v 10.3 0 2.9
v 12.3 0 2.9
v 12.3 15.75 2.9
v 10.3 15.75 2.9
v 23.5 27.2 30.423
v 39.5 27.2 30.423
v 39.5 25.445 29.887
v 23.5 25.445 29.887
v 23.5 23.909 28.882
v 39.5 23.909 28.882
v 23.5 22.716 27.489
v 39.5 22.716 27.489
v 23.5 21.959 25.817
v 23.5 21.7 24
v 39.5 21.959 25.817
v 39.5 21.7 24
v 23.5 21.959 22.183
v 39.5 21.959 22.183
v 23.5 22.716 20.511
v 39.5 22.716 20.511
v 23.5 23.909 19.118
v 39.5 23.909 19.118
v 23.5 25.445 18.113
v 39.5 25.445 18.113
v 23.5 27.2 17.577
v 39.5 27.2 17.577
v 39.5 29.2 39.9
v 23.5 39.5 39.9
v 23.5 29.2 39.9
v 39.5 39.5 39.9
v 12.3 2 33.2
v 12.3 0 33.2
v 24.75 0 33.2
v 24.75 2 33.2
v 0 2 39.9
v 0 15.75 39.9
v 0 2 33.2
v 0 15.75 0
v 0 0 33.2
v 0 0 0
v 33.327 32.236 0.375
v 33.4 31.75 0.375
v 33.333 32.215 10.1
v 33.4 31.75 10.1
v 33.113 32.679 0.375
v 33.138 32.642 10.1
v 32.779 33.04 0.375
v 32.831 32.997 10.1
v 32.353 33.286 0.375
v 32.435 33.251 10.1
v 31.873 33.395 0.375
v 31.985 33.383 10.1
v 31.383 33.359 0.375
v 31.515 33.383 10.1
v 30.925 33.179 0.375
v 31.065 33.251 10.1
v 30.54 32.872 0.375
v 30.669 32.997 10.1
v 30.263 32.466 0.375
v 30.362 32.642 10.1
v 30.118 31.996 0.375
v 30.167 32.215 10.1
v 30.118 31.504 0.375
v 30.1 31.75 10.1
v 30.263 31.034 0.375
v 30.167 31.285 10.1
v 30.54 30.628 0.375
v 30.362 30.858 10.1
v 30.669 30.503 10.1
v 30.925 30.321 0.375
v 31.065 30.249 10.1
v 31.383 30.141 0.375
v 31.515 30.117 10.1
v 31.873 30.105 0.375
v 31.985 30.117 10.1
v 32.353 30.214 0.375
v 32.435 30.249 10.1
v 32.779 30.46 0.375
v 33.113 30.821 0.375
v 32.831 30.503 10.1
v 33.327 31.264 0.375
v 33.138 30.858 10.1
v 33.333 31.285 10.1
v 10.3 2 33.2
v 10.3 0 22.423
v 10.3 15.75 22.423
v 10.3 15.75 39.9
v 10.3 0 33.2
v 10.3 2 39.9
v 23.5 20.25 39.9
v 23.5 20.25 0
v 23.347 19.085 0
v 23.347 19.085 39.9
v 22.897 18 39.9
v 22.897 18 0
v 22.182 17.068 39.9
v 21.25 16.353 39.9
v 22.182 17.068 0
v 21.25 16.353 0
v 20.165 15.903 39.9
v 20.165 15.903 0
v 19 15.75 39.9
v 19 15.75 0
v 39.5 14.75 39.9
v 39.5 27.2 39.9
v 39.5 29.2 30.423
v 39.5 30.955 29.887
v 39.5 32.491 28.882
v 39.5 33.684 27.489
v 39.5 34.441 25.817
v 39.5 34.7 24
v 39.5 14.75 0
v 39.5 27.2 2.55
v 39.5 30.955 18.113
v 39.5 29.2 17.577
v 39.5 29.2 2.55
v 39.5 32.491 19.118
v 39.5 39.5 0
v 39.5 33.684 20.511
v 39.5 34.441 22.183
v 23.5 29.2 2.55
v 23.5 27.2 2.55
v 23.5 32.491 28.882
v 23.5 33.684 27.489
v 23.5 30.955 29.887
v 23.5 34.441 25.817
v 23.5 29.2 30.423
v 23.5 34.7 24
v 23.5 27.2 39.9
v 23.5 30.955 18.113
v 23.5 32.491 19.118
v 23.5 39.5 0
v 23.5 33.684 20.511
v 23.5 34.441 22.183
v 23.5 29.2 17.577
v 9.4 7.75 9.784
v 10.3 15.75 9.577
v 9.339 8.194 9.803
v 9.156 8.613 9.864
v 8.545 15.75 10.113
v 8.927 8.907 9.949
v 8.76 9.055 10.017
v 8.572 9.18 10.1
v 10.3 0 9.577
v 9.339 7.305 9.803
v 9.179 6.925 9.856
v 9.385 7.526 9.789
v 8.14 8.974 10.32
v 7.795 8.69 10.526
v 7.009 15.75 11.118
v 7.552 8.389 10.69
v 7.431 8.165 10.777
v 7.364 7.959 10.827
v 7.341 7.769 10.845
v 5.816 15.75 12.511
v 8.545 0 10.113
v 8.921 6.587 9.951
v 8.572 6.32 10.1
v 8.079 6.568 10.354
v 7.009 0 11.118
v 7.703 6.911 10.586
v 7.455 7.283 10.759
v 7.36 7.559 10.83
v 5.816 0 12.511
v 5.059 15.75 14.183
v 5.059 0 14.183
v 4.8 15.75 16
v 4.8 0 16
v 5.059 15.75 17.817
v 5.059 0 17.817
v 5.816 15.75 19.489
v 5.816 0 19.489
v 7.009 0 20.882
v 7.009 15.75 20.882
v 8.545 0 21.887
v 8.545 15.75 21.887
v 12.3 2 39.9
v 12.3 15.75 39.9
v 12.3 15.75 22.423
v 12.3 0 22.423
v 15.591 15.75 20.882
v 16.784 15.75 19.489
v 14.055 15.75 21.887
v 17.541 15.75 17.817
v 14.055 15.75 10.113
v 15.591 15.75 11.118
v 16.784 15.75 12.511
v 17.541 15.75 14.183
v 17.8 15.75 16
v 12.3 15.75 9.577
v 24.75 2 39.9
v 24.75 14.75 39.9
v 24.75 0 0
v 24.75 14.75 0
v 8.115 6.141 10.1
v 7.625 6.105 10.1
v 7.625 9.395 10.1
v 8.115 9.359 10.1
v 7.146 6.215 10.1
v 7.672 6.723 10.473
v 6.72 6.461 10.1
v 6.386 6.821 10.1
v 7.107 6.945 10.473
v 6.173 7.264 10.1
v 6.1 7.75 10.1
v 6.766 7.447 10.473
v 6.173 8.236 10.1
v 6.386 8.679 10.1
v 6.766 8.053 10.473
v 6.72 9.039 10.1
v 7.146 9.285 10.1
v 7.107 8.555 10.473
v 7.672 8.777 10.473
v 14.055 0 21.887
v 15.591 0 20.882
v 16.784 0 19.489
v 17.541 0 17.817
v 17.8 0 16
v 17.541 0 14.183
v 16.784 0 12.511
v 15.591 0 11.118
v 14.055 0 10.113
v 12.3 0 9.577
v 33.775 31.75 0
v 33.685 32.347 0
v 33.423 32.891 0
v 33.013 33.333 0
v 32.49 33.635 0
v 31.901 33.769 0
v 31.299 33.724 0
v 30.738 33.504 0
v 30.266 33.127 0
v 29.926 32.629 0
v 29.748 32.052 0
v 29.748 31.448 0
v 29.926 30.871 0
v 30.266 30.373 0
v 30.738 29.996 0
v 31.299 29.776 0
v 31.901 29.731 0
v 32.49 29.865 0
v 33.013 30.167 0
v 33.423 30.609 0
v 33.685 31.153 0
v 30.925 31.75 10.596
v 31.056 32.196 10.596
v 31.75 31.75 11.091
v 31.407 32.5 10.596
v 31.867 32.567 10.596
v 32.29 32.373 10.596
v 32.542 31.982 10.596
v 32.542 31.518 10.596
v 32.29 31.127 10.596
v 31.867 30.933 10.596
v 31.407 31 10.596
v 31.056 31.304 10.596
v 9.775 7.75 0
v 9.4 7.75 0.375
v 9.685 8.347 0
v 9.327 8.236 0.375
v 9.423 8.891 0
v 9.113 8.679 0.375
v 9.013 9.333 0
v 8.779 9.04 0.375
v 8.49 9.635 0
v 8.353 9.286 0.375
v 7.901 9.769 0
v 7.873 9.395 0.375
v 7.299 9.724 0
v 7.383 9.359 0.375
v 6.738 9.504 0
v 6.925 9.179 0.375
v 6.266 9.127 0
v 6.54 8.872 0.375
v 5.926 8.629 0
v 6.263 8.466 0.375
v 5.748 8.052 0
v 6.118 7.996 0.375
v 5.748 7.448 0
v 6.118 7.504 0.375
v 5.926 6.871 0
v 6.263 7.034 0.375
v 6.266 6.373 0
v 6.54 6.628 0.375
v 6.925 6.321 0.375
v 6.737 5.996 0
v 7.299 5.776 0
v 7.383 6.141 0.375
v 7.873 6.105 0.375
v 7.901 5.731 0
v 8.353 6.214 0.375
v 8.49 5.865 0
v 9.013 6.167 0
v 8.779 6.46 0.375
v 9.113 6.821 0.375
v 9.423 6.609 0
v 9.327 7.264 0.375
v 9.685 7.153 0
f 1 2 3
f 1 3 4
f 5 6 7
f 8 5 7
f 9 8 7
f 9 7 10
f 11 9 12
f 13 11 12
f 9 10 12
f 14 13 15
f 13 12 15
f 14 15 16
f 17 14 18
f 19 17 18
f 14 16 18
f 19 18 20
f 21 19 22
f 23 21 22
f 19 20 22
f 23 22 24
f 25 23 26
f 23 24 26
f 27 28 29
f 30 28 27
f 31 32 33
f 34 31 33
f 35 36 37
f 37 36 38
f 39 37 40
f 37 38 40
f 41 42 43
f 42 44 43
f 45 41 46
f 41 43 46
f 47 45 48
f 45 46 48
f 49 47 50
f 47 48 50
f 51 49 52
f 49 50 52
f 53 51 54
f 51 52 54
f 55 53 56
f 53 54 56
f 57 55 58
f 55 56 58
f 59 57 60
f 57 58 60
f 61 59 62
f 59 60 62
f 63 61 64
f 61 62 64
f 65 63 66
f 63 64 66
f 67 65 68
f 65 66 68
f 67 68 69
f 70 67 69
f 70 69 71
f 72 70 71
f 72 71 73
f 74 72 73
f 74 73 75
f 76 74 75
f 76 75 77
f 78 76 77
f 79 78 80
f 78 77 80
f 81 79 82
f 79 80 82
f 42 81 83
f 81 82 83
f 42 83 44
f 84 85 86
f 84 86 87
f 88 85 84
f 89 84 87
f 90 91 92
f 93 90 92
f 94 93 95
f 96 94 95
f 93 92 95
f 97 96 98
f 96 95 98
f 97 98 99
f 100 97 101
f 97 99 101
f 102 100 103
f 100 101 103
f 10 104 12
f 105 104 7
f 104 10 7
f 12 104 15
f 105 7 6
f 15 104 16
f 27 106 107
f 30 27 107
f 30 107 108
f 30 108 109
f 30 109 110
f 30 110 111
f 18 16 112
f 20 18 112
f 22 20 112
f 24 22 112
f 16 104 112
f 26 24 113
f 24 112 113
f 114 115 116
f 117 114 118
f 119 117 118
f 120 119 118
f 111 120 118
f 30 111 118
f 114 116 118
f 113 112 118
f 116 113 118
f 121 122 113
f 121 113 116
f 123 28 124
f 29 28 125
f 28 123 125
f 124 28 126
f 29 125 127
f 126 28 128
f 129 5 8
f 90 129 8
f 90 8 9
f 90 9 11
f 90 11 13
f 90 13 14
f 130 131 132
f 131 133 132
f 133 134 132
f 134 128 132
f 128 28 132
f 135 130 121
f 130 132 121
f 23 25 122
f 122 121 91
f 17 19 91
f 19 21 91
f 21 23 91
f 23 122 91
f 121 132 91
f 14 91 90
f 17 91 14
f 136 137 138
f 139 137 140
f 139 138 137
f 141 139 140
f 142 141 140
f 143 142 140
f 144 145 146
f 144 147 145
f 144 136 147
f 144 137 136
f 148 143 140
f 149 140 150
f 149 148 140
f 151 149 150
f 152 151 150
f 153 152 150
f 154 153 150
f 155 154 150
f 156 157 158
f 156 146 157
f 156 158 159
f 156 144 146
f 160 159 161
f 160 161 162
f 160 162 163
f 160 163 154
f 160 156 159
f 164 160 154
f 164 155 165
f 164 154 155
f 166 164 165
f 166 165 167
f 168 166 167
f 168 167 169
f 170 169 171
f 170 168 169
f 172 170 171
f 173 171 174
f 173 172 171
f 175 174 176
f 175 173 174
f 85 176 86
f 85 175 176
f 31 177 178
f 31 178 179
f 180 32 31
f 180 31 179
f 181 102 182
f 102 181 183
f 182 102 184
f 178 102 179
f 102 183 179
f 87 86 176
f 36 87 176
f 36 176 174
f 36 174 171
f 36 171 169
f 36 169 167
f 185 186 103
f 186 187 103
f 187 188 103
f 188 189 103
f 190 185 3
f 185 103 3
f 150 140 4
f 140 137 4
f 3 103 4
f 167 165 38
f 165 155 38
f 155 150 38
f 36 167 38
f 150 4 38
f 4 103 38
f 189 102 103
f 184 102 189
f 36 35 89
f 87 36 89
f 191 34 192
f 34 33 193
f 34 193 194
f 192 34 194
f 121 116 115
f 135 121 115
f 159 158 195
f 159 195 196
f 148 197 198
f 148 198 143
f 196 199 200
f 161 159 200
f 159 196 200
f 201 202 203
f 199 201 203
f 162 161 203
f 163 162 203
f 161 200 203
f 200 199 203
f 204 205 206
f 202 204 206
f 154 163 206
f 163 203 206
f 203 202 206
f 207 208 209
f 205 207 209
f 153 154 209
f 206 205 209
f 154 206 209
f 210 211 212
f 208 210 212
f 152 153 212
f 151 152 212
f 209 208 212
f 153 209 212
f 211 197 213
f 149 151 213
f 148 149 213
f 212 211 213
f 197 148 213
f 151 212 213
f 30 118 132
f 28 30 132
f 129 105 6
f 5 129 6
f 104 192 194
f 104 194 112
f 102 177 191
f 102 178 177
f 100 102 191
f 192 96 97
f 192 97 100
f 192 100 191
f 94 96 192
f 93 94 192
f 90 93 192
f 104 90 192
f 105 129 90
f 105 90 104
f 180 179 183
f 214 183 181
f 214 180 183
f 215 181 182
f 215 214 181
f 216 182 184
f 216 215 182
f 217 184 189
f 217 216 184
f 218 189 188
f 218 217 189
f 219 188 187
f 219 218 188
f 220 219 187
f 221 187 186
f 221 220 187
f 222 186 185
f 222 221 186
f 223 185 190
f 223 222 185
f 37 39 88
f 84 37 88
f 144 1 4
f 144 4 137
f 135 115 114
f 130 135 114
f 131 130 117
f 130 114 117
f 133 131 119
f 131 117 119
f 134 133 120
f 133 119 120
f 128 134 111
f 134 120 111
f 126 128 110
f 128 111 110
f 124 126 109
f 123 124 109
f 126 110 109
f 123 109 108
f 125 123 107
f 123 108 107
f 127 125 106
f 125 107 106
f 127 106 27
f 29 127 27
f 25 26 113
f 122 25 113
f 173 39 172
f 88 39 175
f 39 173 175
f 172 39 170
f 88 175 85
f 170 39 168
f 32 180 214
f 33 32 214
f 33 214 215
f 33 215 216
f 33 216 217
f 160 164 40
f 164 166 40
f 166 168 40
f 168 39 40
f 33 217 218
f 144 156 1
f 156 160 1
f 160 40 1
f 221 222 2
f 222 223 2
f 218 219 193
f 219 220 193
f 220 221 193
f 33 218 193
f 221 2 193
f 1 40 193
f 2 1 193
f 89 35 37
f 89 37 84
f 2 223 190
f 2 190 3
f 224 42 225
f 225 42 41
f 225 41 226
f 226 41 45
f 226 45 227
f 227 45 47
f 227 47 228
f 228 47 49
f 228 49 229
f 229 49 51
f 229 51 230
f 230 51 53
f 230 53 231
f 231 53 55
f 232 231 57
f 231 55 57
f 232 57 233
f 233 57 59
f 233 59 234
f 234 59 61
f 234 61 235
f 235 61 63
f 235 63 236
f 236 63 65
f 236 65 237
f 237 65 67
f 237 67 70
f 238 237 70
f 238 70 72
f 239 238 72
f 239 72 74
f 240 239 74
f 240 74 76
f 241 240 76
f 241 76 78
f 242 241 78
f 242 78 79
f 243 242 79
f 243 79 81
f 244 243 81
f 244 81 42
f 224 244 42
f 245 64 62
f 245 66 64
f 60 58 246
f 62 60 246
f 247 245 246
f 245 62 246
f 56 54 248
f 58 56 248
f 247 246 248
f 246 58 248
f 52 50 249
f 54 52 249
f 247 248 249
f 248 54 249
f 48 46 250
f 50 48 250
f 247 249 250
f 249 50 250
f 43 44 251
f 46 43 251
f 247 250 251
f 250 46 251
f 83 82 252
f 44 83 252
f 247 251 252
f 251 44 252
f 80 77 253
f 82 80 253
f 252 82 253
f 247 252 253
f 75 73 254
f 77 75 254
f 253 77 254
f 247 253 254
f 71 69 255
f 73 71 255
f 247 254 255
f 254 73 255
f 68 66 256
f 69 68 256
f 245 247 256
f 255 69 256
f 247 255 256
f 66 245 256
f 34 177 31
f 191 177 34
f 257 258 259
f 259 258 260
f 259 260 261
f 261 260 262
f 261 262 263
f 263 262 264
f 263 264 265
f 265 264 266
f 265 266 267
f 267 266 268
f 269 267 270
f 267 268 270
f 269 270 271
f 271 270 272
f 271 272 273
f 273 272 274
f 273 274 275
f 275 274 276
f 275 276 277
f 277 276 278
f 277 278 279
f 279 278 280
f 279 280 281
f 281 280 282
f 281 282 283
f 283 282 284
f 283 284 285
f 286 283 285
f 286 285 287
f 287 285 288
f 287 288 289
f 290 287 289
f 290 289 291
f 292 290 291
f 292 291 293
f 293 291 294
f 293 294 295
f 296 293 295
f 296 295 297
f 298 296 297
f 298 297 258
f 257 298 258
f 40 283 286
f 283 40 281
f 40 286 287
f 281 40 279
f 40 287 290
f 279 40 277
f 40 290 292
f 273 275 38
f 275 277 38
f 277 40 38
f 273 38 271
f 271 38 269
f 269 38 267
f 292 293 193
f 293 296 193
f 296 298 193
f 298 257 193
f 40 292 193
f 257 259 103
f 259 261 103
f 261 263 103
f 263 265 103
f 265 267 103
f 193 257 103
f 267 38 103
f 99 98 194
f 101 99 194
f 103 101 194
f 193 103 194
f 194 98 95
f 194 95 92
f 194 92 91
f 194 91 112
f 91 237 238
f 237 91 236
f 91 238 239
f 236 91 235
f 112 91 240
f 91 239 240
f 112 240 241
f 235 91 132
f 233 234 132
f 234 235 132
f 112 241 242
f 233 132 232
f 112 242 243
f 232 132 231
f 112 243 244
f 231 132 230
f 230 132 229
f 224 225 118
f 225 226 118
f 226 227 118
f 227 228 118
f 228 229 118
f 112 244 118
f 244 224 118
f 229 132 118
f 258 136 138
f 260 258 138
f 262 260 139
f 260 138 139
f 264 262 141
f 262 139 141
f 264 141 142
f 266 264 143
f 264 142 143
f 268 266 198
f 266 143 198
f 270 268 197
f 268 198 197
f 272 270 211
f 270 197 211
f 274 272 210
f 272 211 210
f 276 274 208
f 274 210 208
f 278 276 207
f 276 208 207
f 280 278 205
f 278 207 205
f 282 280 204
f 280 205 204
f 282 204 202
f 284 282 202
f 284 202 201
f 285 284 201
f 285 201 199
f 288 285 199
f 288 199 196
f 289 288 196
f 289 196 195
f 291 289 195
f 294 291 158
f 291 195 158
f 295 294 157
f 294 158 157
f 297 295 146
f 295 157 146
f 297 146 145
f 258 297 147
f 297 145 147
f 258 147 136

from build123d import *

# Parameters (mm, degrees)
BOSS_EXTRUDE1_DEPTH         = 39.9
CUT_EXTRUDE1_DEPTH          = 1
CUT_EXTRUDE1_DEPTH_BACK     = 40.5
CUT_EXTRUDE2_DEPTH          = 1
CUT_EXTRUDE2_DEPTH_BACK     = 40.5
M4_TAPPED_HOLE1_D           = 3.3
M4_TAPPED_HOLE1_DEPTH       = 10.1
M4_TAPPED_HOLE1_CSINK_D     = 4.05
M4_TAPPED_HOLE1_CSINK_ANGLE = 90
M4_TAPPED_HOLE1_TIP         = 0.991420021
SKETCH6_W                   = 24.75
SKETCH6_H                   = 6.7
CUT_EXTRUDE3_DEPTH          = 2


with BuildPart() as part:
    # Sketch1 → Boss-Extrude1 (new body)
    with BuildSketch(Plane.XY):
        with BuildLine():
            Line((24.75, 0), (24.75, 14.75))
            Line((24.75, 14.75), (39.5, 14.75))
            Line((39.5, 14.75), (39.5, 39.5))
            Line((39.5, 39.5), (23.5, 39.5))
            Line((23.5, 39.5), (23.5, 20.25))
            ThreePointArc((23.5, 20.25), (22.181980515, 17.068019485), (19, 15.75))
            Line((19, 15.75), (0, 15.75))
            Line((0, 15.75), (0, 0))
            Line((0, 0), (24.75, 0))
        make_face()
    extrude(amount=BOSS_EXTRUDE1_DEPTH)

    # Sketch2 → Cut-Extrude1 (cut, two sides)
    with BuildSketch(Plane.XZ) as cut_extrude1_sk:
        with BuildLine():
            Line((10.3, 39.9), (12.3, 39.9))
            Line((12.3, 39.9), (12.3, 22.422616289))
            ThreePointArc((12.3, 22.422616289), (17.8, 16), (12.3, 9.577383711))
            Line((12.3, 9.577383711), (12.3, 2.9))
            Line((12.3, 2.9), (10.3, 2.9))
            Line((10.3, 2.9), (10.3, 9.577383711))
            ThreePointArc((10.3, 9.577383711), (4.8, 16), (10.3, 22.422616289))
            Line((10.3, 22.422616289), (10.3, 39.9))
        make_face()
    extrude(amount=CUT_EXTRUDE1_DEPTH, mode=Mode.SUBTRACT)
    extrude(cut_extrude1_sk.sketch, amount=-CUT_EXTRUDE1_DEPTH_BACK, mode=Mode.SUBTRACT)

    # Sketch3 → Cut-Extrude2 (cut, two sides)
    with BuildSketch(Plane(origin=(39.5, 0, 0), x_dir=(0, 0, -1), z_dir=(1, 0, 0))) as cut_extrude2_sk:
        with BuildLine():
            Line((-39.9, 27.2), (-30.422616289, 27.2))
            ThreePointArc((-30.422616289, 27.2), (-24, 21.7), (-17.577383711, 27.2))
            Line((-17.577383711, 27.2), (-2.55, 27.2))
            Line((-2.55, 27.2), (-2.55, 29.2))
            Line((-2.55, 29.2), (-17.577383711, 29.2))
            ThreePointArc((-17.577383711, 29.2), (-24, 34.7), (-30.422616289, 29.2))
            Line((-30.422616289, 29.2), (-39.9, 29.2))
            Line((-39.9, 29.2), (-39.9, 27.2))
        make_face()
    extrude(amount=CUT_EXTRUDE2_DEPTH, mode=Mode.SUBTRACT)
    extrude(cut_extrude2_sk.sketch, amount=-CUT_EXTRUDE2_DEPTH_BACK, mode=Mode.SUBTRACT)

    # M4 Tapped Hole1
    with Locations(Plane(origin=(0, 0, 0), x_dir=(-1, 0, 0), z_dir=(0, 0, -1))):
        with Locations((-31.75, 31.75), (-7.75, 7.75)):
            CounterSinkHole(M4_TAPPED_HOLE1_D / 2, M4_TAPPED_HOLE1_CSINK_D / 2, depth=M4_TAPPED_HOLE1_DEPTH, counter_sink_angle=M4_TAPPED_HOLE1_CSINK_ANGLE)
            with Locations((0, 0, -(M4_TAPPED_HOLE1_DEPTH + M4_TAPPED_HOLE1_TIP / 2))):  # 118° drill point
                Cone(0, M4_TAPPED_HOLE1_D / 2, M4_TAPPED_HOLE1_TIP, mode=Mode.SUBTRACT)

    # Sketch6 → Cut-Extrude3 (cut)
    with BuildSketch(Plane.XZ):
        with Locations((12.375, 36.55)):
            Rectangle(SKETCH6_W, SKETCH6_H)
    extrude(amount=-CUT_EXTRUDE3_DEPTH, mode=Mode.SUBTRACT)


solid = part.part
